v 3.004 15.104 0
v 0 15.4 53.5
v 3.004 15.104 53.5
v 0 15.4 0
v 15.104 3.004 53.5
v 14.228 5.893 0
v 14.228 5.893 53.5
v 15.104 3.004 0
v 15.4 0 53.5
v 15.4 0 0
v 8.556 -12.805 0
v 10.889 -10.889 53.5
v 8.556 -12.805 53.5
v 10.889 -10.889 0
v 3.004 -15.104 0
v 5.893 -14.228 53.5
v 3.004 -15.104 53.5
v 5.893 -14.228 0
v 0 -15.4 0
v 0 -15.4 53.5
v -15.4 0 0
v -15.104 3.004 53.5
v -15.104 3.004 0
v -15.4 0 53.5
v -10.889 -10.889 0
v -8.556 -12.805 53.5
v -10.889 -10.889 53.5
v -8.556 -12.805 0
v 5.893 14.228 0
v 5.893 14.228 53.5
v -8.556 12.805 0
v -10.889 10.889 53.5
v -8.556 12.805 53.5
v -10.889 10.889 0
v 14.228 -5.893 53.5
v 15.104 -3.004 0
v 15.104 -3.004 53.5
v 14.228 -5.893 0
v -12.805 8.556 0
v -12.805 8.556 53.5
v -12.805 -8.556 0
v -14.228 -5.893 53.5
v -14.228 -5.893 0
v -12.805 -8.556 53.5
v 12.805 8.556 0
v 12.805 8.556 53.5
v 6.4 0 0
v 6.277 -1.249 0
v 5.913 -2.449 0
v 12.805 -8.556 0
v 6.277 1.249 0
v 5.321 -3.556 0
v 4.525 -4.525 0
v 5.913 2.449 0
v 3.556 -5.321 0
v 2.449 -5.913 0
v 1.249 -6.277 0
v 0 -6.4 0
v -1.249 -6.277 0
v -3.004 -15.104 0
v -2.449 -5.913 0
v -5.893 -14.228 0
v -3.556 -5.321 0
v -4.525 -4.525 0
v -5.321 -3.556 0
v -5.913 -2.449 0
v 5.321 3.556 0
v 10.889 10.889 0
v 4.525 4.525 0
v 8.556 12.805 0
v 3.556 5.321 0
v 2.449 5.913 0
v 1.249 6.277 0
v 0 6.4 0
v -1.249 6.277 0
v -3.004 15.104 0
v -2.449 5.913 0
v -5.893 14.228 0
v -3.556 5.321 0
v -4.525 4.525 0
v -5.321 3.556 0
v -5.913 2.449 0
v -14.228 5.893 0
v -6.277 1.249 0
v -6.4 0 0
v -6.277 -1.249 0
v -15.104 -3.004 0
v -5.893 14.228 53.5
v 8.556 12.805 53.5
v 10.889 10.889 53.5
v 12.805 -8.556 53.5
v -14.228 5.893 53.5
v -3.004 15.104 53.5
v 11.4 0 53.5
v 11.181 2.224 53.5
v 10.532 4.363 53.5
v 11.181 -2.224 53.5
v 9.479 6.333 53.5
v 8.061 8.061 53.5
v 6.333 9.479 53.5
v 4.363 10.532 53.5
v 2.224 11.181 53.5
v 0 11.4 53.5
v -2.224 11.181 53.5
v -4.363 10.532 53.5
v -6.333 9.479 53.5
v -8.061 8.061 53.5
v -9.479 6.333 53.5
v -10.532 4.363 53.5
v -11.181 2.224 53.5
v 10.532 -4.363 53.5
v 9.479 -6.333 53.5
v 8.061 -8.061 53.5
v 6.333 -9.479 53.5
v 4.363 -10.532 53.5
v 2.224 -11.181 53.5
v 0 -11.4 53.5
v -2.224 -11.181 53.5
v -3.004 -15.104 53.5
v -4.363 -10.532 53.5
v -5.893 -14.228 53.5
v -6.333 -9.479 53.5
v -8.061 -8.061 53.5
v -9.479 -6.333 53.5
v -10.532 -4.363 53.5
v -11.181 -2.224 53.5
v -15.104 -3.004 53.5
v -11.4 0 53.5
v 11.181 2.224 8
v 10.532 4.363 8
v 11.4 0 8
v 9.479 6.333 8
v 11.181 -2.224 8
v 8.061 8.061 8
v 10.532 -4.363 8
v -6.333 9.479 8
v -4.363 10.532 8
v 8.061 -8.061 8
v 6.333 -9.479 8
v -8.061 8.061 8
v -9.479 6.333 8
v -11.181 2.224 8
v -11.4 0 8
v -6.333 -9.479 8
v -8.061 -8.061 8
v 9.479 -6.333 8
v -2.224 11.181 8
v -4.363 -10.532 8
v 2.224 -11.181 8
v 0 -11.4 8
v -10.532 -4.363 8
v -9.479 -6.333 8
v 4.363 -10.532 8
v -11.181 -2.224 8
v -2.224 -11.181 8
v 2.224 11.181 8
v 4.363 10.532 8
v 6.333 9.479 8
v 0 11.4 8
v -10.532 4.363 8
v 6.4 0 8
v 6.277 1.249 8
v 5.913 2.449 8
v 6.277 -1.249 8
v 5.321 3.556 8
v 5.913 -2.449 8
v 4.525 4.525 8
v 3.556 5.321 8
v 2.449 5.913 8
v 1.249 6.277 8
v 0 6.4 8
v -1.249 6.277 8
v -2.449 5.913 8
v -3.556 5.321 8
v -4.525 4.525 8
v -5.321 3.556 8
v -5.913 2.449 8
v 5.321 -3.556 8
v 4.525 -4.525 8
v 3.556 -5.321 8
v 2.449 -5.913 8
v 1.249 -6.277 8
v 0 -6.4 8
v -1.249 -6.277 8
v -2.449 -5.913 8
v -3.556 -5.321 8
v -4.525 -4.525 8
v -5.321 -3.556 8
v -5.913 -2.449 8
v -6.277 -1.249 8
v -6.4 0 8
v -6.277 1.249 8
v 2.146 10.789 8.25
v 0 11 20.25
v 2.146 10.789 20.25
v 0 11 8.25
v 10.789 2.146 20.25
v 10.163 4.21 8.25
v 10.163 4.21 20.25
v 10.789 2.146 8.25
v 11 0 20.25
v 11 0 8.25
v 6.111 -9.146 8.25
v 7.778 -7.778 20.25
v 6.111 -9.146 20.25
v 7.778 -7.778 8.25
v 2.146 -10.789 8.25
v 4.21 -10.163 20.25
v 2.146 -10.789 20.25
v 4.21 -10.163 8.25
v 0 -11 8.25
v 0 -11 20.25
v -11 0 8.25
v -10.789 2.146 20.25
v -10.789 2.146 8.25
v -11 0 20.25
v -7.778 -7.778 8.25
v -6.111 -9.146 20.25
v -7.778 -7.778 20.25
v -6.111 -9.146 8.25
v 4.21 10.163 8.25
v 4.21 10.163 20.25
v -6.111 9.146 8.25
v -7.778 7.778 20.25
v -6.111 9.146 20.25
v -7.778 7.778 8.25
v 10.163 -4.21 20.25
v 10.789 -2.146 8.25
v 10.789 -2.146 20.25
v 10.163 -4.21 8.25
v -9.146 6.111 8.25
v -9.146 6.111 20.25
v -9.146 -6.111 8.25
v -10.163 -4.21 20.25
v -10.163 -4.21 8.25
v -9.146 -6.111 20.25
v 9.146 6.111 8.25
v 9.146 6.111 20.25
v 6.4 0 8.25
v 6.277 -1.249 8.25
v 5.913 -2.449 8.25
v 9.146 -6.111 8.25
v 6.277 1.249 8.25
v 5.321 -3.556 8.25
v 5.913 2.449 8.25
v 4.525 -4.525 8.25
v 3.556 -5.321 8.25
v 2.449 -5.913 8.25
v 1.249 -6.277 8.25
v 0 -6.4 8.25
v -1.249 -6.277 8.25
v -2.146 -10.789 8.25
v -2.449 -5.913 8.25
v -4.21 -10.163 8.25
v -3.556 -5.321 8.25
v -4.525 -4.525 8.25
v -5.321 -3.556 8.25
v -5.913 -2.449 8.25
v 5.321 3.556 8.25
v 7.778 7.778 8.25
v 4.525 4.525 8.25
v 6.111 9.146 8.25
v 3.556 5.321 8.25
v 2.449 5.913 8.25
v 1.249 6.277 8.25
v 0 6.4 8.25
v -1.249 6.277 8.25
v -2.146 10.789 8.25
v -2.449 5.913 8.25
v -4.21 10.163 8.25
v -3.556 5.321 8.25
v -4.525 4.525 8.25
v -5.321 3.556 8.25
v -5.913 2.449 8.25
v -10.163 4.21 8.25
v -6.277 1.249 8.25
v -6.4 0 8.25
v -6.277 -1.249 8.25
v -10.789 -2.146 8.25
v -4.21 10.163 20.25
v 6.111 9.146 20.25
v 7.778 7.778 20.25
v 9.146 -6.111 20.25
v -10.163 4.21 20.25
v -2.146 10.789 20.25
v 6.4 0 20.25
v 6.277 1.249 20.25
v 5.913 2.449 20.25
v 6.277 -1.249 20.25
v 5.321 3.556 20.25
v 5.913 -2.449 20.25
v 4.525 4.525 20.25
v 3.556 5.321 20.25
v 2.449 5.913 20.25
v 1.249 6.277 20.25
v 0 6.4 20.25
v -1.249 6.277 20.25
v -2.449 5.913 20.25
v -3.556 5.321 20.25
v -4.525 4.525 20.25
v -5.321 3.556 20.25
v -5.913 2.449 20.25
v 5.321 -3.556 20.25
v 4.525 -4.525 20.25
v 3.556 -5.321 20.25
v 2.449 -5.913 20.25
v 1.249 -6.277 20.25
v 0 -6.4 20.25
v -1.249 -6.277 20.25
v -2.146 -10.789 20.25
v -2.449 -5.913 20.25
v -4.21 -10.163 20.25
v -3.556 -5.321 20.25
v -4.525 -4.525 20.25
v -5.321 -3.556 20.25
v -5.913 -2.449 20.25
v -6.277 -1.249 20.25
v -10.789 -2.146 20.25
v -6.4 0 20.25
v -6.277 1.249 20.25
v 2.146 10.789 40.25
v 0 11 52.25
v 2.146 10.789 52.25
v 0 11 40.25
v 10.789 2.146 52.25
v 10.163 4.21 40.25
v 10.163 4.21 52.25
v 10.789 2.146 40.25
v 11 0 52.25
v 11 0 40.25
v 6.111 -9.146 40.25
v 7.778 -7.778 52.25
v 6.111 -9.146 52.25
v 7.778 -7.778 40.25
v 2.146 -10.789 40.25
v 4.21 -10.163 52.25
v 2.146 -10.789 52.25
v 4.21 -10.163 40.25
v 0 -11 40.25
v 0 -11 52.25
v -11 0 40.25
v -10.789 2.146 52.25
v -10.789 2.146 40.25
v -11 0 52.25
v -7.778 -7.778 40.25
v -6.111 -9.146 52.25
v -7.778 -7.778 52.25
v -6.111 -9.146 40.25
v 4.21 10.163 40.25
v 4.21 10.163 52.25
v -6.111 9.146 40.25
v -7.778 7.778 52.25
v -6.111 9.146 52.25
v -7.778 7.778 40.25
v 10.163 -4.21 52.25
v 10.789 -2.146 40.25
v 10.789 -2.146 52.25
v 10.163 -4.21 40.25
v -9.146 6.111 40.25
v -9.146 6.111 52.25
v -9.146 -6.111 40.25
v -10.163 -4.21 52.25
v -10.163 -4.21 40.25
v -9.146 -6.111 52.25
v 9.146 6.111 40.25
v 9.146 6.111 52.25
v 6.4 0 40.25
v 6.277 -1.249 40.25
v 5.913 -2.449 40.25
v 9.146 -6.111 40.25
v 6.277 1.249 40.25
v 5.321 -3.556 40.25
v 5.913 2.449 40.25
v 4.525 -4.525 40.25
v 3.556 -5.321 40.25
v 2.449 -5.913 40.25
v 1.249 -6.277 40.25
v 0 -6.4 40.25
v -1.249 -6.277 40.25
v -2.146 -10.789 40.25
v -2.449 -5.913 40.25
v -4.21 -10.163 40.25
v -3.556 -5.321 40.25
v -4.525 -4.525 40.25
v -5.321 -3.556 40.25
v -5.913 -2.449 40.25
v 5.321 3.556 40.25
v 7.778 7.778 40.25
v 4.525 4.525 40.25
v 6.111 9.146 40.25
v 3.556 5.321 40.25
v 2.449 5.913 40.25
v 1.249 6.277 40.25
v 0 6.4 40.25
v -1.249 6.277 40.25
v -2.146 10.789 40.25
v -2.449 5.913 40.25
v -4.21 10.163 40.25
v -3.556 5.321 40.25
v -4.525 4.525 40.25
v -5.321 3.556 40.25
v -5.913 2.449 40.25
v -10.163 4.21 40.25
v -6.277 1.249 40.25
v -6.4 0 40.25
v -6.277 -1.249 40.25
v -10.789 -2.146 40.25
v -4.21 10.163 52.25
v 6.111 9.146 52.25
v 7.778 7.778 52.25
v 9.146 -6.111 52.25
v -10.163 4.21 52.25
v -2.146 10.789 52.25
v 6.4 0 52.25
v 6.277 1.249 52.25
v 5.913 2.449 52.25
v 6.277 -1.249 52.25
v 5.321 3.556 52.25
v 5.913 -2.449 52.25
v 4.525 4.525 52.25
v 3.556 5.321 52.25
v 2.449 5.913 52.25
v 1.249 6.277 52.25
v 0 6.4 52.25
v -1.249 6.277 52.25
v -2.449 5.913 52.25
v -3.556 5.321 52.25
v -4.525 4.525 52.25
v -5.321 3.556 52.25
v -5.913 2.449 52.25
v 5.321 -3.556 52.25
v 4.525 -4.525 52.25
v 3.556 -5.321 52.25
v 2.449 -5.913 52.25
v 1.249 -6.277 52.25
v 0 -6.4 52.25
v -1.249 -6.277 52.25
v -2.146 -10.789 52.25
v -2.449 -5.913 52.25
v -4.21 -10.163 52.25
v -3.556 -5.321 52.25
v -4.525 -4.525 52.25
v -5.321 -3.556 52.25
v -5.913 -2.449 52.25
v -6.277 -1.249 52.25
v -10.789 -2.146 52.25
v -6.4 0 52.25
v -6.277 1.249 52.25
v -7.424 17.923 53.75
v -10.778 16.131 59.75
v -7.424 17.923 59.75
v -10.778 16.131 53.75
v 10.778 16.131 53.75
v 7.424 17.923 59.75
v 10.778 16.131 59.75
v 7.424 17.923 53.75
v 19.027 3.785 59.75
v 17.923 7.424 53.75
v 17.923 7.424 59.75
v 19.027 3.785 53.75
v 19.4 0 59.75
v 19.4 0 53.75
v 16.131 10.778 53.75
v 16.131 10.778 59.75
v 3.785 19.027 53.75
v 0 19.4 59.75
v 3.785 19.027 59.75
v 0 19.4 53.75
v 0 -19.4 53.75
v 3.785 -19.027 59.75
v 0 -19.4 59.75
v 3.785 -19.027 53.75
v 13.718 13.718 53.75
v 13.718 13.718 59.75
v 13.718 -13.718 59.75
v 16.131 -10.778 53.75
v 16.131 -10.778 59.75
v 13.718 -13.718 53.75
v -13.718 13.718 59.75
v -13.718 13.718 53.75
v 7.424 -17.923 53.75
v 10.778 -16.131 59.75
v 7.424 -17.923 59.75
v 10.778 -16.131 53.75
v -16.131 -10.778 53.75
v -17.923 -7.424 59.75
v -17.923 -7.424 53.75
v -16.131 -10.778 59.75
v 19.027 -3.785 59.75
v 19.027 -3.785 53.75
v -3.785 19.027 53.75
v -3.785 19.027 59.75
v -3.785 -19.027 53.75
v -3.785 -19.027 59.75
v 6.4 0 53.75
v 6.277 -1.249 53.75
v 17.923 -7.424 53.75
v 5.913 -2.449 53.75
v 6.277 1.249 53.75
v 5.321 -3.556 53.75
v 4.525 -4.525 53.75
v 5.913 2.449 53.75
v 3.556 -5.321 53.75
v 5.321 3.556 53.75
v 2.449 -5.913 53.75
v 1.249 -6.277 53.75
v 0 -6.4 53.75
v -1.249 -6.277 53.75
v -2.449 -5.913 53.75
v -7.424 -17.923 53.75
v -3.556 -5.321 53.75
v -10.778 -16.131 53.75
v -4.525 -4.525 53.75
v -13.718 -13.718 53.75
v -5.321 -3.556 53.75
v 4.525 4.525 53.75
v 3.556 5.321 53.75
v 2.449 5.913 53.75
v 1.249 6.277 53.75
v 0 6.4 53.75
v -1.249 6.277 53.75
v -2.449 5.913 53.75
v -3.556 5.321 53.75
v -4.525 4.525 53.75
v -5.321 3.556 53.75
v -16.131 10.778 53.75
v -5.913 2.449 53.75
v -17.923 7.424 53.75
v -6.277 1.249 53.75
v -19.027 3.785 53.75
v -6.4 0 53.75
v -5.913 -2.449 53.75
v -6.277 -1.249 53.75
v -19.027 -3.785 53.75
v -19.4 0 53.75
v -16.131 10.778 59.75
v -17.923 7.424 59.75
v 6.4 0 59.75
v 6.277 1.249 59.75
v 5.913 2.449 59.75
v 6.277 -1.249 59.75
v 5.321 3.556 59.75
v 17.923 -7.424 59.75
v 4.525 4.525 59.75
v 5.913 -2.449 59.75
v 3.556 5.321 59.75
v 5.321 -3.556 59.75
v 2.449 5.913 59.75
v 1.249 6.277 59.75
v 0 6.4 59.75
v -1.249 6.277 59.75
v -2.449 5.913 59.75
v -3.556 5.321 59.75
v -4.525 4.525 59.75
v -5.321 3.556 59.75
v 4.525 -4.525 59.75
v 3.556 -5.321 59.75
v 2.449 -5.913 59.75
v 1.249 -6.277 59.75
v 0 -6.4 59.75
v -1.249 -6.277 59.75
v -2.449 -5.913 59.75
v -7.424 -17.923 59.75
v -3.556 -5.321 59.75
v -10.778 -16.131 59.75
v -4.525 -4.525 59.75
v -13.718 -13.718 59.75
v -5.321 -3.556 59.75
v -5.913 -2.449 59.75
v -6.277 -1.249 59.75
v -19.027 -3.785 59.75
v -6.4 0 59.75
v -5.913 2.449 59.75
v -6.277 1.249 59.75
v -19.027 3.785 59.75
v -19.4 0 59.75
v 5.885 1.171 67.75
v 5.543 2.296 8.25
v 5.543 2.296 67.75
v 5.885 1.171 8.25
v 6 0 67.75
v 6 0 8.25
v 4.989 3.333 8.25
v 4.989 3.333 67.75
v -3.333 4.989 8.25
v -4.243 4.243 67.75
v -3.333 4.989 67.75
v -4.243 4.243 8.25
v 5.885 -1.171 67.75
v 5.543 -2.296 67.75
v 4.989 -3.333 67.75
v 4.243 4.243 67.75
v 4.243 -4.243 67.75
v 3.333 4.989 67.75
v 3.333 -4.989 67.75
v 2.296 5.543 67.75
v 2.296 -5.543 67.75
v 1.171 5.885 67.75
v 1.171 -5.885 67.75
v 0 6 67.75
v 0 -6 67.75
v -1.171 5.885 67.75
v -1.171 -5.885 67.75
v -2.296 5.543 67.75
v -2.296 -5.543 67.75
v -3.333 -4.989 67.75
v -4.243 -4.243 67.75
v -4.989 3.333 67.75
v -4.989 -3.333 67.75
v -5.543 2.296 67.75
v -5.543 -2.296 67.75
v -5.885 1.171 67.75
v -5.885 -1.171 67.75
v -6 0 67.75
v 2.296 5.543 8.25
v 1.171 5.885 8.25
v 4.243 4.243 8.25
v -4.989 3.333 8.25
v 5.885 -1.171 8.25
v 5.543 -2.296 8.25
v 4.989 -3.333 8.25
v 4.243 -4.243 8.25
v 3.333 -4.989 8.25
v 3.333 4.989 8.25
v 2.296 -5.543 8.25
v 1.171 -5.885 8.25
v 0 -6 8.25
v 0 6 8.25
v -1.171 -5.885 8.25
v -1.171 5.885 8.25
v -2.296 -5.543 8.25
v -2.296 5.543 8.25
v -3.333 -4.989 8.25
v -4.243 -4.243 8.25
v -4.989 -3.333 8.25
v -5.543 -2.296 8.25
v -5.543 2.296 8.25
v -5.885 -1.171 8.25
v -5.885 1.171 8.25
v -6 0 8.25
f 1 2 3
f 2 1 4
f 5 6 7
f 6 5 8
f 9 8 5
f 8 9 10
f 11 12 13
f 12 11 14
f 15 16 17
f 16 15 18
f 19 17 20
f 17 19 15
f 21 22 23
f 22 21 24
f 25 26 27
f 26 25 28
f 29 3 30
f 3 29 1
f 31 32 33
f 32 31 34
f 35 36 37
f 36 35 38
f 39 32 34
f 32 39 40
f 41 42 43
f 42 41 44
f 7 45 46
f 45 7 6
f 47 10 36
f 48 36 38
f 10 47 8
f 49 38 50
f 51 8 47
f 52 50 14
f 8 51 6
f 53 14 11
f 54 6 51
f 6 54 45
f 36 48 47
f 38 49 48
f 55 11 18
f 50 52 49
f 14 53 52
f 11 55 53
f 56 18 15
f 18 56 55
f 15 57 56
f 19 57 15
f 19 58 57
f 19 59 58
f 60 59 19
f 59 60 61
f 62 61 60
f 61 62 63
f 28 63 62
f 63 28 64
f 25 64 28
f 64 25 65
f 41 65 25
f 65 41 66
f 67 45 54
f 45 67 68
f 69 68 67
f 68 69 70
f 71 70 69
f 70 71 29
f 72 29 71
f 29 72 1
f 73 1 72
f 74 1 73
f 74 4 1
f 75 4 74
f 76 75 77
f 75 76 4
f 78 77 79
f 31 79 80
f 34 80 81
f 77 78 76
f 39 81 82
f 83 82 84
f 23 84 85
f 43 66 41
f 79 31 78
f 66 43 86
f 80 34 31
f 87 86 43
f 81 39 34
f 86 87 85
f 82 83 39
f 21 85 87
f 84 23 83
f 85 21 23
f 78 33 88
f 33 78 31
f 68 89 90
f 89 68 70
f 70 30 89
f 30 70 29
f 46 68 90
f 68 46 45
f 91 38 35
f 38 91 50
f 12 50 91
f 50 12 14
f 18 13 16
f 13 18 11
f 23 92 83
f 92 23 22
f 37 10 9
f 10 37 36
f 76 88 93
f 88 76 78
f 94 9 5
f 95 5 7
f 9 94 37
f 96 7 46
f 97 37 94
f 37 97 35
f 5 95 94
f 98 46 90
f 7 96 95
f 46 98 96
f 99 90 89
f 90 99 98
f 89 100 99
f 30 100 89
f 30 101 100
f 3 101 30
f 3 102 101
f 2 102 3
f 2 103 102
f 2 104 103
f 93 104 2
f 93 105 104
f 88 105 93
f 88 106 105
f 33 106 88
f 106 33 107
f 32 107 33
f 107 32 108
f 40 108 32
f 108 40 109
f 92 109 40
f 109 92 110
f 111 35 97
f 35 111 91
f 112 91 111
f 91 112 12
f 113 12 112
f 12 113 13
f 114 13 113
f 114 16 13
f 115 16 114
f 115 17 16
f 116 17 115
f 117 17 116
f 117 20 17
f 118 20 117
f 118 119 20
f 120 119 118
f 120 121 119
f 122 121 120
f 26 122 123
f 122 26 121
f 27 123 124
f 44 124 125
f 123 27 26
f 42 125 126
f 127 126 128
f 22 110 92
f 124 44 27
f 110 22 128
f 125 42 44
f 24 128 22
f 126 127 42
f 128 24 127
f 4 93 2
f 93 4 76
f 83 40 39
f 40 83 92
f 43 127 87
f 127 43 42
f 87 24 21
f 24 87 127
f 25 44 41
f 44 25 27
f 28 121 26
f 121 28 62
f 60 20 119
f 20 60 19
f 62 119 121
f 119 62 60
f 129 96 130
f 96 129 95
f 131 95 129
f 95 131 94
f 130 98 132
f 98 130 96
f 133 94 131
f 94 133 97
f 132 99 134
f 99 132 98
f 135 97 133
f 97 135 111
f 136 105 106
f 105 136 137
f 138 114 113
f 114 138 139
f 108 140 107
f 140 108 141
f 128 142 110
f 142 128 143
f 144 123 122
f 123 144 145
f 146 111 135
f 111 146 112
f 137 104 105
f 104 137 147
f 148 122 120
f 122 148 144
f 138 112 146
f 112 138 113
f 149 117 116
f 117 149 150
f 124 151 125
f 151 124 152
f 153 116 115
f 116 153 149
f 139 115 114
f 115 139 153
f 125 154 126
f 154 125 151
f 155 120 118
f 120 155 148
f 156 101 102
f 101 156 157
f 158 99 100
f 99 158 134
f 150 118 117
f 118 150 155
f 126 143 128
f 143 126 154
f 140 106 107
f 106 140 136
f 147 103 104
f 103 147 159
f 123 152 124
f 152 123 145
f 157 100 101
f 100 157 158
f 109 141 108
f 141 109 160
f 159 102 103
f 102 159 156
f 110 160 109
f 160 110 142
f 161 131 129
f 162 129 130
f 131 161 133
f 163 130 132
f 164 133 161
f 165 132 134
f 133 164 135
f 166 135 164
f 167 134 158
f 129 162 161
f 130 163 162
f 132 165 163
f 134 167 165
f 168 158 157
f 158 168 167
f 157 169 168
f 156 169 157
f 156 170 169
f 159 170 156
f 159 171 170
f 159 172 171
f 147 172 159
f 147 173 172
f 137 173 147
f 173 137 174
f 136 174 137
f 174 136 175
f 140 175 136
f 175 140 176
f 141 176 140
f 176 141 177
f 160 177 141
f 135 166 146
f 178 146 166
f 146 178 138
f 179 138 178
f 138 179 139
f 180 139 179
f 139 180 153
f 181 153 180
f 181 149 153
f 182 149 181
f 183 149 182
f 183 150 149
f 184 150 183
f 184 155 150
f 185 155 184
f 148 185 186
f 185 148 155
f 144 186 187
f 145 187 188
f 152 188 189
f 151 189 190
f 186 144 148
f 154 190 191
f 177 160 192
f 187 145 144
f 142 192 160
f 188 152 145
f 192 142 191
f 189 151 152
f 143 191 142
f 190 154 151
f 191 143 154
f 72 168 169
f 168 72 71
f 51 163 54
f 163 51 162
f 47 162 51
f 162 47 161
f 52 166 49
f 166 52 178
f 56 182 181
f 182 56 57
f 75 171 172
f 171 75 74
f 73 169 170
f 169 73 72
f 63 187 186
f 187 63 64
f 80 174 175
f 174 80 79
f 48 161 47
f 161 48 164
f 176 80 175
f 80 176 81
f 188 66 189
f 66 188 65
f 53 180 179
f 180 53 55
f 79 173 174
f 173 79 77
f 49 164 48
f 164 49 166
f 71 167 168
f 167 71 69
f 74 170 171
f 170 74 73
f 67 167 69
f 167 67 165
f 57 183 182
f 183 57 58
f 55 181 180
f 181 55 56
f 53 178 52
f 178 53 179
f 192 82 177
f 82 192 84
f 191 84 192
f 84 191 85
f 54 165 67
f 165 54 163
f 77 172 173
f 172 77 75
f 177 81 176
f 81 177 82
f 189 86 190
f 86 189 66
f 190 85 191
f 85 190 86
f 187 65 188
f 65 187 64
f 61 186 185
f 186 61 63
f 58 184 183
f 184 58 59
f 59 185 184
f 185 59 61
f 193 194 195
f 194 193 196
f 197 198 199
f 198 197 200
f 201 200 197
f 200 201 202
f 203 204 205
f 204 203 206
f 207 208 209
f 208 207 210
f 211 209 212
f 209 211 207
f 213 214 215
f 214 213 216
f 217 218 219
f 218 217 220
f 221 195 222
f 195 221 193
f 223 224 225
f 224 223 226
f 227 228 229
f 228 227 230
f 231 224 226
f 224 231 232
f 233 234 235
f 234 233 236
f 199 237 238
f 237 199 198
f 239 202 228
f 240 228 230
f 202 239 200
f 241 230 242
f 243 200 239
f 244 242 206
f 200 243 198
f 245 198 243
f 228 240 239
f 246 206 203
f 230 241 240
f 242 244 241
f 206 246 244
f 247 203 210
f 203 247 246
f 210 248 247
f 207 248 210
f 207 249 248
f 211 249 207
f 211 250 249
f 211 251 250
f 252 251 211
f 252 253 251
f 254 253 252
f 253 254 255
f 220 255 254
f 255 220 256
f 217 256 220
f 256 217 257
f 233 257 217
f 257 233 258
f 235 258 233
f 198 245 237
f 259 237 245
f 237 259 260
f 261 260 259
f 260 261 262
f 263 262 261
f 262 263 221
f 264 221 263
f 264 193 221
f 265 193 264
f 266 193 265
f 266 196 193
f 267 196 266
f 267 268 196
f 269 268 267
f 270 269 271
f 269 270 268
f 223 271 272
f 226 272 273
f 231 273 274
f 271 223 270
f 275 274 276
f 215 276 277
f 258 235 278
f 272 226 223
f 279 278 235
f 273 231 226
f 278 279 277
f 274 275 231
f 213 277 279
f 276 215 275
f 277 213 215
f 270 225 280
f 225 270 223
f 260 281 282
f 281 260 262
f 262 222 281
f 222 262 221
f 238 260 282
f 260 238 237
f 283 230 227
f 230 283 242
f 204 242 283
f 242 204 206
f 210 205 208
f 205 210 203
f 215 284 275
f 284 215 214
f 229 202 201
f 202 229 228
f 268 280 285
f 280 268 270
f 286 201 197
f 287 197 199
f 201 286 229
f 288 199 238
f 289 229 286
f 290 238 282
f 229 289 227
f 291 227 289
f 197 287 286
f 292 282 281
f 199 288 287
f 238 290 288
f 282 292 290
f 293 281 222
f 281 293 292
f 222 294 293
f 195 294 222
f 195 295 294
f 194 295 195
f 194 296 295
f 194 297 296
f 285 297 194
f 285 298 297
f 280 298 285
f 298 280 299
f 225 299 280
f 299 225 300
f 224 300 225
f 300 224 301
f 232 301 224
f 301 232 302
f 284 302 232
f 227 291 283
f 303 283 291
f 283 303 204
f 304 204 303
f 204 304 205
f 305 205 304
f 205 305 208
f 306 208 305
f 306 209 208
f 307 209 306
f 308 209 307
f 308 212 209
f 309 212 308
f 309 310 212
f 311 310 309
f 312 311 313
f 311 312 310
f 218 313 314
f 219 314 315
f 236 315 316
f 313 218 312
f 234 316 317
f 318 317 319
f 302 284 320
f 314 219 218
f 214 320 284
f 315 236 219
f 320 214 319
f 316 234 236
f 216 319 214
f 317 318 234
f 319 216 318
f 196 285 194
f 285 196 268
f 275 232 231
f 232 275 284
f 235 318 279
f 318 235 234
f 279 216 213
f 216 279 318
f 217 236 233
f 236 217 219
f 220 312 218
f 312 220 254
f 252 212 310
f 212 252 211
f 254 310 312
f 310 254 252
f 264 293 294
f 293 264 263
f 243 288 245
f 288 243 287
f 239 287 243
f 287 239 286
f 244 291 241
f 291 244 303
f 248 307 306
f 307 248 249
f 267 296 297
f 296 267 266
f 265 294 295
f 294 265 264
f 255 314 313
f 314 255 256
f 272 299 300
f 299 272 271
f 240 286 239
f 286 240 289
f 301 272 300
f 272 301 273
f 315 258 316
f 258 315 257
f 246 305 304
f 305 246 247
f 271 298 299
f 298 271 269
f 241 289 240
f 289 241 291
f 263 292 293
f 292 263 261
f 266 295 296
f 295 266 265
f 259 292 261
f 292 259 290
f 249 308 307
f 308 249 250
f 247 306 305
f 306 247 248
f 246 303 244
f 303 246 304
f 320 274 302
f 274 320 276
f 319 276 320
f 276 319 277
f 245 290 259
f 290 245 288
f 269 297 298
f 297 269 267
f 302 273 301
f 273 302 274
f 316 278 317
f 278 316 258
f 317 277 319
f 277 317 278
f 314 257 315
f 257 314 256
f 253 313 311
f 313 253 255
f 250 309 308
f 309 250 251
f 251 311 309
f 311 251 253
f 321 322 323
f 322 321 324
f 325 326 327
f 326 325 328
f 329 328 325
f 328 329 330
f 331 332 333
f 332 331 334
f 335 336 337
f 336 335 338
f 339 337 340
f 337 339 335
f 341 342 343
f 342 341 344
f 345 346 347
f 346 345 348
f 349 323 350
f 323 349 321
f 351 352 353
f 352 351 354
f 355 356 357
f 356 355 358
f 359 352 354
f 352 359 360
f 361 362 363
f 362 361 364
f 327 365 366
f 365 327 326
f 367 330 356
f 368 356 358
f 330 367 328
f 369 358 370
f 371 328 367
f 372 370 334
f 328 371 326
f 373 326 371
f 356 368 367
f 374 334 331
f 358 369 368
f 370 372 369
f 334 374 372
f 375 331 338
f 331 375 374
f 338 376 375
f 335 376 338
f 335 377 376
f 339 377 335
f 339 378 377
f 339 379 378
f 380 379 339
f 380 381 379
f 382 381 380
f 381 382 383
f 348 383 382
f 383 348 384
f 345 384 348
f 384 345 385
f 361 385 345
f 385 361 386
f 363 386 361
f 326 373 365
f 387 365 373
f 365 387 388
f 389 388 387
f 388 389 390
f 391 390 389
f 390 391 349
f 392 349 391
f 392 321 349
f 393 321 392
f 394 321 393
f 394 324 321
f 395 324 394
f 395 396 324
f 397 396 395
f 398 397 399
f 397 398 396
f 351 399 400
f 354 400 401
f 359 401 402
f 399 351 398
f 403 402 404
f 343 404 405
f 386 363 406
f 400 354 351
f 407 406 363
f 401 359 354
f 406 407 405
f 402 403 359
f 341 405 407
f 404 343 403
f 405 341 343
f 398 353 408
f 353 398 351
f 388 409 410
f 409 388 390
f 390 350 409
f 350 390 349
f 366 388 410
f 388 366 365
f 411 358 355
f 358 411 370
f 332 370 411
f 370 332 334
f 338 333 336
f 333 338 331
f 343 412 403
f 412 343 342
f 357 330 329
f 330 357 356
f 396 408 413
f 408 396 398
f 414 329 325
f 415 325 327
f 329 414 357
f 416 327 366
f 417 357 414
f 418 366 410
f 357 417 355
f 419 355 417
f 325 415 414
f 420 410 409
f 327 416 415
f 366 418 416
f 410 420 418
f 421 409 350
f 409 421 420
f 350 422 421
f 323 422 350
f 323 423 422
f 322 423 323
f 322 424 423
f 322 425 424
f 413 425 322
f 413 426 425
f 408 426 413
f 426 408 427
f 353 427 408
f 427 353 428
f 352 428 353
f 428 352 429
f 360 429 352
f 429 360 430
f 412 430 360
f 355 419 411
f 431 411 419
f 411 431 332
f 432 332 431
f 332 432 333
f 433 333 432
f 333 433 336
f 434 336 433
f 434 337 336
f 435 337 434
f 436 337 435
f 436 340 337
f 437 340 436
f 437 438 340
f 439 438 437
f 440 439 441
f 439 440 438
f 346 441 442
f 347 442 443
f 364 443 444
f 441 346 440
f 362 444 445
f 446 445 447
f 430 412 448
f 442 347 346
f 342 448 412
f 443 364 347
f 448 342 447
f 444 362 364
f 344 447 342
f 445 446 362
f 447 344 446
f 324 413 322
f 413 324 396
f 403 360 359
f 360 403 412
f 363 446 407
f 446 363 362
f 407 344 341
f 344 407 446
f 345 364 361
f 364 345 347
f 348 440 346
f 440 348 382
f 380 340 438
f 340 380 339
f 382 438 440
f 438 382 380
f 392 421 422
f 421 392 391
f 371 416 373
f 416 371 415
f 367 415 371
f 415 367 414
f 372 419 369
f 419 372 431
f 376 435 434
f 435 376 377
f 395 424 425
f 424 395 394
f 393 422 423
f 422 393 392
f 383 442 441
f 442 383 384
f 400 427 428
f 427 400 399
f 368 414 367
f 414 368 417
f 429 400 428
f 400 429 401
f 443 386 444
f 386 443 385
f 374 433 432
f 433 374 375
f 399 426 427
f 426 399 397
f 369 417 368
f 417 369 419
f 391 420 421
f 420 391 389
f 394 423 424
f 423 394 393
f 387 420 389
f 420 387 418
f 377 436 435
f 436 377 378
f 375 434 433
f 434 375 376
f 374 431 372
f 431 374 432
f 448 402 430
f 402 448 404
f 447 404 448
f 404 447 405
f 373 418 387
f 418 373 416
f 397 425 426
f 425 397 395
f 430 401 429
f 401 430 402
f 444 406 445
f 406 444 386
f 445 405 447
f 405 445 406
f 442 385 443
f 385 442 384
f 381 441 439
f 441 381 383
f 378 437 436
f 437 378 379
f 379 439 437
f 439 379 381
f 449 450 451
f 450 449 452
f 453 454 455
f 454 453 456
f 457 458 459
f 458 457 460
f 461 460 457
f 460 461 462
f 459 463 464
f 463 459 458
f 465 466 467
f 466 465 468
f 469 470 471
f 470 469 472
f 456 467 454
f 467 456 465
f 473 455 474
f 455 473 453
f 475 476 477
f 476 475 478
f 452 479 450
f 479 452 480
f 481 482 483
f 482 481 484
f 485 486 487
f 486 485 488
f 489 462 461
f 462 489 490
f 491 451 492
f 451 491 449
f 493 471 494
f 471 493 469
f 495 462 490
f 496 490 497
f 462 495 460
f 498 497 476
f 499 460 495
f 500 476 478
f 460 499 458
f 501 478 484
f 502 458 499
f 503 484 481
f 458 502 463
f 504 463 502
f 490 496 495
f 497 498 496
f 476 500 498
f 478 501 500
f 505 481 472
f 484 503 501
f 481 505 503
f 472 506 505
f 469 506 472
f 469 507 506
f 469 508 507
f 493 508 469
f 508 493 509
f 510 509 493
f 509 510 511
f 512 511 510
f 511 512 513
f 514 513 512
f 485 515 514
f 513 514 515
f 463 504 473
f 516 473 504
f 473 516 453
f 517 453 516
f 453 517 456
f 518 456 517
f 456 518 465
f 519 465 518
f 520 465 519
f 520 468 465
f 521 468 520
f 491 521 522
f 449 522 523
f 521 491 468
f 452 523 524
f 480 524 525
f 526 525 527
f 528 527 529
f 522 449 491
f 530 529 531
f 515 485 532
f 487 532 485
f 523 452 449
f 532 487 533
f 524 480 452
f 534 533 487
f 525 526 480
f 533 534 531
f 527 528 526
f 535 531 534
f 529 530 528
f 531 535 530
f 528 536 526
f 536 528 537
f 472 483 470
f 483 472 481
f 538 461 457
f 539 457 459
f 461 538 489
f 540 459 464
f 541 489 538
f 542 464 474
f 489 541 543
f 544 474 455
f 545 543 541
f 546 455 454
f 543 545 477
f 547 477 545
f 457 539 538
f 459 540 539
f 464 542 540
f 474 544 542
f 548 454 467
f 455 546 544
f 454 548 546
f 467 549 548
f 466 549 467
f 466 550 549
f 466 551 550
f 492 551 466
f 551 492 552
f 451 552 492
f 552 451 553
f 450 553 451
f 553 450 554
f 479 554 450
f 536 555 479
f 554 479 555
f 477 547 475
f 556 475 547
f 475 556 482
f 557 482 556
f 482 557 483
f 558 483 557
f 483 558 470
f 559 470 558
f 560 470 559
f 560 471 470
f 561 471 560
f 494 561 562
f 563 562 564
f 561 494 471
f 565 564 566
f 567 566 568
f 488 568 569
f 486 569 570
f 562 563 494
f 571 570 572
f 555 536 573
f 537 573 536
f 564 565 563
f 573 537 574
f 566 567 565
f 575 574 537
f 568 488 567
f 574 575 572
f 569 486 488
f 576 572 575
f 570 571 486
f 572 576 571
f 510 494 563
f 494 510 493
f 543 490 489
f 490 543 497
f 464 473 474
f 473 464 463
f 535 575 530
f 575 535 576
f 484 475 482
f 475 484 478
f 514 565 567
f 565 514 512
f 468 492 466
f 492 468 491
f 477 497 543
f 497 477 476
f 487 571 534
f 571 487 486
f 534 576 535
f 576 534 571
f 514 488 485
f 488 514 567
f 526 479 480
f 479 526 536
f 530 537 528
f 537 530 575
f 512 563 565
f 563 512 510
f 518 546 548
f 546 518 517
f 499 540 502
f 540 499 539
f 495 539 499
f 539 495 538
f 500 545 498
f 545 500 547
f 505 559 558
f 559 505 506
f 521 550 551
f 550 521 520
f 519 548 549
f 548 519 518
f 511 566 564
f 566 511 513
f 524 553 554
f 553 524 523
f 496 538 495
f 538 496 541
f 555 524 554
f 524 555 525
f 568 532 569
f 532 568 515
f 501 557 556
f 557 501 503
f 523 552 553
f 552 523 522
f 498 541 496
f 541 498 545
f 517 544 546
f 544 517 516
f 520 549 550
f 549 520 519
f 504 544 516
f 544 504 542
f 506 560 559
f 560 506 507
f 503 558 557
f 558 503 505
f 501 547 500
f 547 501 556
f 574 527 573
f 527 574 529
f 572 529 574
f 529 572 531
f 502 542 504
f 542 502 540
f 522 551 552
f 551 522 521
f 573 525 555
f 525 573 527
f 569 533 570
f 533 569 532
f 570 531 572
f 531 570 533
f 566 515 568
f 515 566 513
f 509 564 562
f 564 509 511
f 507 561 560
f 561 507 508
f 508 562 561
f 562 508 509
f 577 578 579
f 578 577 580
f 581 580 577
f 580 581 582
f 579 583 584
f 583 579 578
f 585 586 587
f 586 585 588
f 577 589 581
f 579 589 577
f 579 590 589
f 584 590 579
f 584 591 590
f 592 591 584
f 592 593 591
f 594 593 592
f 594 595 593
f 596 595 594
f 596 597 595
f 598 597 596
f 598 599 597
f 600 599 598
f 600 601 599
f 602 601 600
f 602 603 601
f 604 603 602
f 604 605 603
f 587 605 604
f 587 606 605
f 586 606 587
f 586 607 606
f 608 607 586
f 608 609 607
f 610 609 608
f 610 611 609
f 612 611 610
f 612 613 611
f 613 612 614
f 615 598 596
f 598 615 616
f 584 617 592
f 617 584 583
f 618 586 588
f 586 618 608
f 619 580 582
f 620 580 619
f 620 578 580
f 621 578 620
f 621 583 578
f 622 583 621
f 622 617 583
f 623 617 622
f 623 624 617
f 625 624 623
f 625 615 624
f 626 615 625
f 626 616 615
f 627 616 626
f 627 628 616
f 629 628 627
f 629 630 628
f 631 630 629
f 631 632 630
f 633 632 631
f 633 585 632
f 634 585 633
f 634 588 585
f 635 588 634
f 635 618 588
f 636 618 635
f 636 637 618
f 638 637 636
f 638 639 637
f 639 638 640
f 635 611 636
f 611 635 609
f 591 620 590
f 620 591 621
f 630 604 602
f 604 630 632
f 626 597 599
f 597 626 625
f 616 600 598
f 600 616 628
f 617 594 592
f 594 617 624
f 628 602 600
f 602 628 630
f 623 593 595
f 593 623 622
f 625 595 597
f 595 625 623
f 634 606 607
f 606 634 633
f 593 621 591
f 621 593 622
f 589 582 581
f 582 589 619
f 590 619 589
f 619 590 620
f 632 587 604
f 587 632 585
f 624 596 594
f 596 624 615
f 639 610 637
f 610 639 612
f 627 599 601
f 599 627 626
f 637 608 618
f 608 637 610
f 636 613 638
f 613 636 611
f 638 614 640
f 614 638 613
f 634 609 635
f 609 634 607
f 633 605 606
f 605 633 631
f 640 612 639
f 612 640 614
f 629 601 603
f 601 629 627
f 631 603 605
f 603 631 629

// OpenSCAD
$fn = 32;

// ------------------------------------------------------------------------
// Shaft station: cup d30.8 x 53.5 mm, shaft d12
// Every part is its own module, assembly() places every instance.
// ------------------------------------------------------------------------

// --- part 1 ---
module housing_cup() {
  difference() {
    cylinder(h = 53.5, d = 30.8);
    translate([0, 0, 8]) cylinder(h = 46.5, d = 22.8);
    translate([0, 0, -1]) cylinder(h = 10, d = 12.8);
  }
}

// --- part 2 ---
module bearing_lower() {
  difference() {
      translate([0, 0, 0]) cylinder(h = 12, d = 22);
      translate([0, 0, -1]) cylinder(h = 14, d = 12.8);
    }
}

// --- part 3 ---
module bearing_upper() {
  difference() {
      translate([0, 0, 0]) cylinder(h = 12, d = 22);
      translate([0, 0, -1]) cylinder(h = 14, d = 12.8);
    }
}

// --- part 4 ---
module station_shaft() {
  translate([0, 0, -29.75]) cylinder(h = 59.5, d = 12);
}

// --- part 5 ---
module station_cover() {
  difference() {
    cylinder(h = 6, d = 38.8);
    translate([0, 0, -1]) cylinder(h = 8, d = 12.8);
  }
}

// --- assembly ---
module assembly() {
  color([0.80, 0.24, 0.20]) translate([0, 0, 0]) rotate([0, 0, 0]) housing_cup();
  color([0.20, 0.45, 0.75]) translate([0, 0, 8.25]) rotate([0, 0, 0]) bearing_lower();
  color([0.25, 0.62, 0.32]) translate([0, 0, 40.25]) rotate([0, 0, 0]) bearing_upper();
  color([0.92, 0.70, 0.18]) translate([0, 0, 38]) rotate([0, 0, 0]) station_shaft();
  color([0.58, 0.35, 0.70]) translate([0, 0, 53.75]) rotate([0, 0, 0]) station_cover();
}

assembly();
